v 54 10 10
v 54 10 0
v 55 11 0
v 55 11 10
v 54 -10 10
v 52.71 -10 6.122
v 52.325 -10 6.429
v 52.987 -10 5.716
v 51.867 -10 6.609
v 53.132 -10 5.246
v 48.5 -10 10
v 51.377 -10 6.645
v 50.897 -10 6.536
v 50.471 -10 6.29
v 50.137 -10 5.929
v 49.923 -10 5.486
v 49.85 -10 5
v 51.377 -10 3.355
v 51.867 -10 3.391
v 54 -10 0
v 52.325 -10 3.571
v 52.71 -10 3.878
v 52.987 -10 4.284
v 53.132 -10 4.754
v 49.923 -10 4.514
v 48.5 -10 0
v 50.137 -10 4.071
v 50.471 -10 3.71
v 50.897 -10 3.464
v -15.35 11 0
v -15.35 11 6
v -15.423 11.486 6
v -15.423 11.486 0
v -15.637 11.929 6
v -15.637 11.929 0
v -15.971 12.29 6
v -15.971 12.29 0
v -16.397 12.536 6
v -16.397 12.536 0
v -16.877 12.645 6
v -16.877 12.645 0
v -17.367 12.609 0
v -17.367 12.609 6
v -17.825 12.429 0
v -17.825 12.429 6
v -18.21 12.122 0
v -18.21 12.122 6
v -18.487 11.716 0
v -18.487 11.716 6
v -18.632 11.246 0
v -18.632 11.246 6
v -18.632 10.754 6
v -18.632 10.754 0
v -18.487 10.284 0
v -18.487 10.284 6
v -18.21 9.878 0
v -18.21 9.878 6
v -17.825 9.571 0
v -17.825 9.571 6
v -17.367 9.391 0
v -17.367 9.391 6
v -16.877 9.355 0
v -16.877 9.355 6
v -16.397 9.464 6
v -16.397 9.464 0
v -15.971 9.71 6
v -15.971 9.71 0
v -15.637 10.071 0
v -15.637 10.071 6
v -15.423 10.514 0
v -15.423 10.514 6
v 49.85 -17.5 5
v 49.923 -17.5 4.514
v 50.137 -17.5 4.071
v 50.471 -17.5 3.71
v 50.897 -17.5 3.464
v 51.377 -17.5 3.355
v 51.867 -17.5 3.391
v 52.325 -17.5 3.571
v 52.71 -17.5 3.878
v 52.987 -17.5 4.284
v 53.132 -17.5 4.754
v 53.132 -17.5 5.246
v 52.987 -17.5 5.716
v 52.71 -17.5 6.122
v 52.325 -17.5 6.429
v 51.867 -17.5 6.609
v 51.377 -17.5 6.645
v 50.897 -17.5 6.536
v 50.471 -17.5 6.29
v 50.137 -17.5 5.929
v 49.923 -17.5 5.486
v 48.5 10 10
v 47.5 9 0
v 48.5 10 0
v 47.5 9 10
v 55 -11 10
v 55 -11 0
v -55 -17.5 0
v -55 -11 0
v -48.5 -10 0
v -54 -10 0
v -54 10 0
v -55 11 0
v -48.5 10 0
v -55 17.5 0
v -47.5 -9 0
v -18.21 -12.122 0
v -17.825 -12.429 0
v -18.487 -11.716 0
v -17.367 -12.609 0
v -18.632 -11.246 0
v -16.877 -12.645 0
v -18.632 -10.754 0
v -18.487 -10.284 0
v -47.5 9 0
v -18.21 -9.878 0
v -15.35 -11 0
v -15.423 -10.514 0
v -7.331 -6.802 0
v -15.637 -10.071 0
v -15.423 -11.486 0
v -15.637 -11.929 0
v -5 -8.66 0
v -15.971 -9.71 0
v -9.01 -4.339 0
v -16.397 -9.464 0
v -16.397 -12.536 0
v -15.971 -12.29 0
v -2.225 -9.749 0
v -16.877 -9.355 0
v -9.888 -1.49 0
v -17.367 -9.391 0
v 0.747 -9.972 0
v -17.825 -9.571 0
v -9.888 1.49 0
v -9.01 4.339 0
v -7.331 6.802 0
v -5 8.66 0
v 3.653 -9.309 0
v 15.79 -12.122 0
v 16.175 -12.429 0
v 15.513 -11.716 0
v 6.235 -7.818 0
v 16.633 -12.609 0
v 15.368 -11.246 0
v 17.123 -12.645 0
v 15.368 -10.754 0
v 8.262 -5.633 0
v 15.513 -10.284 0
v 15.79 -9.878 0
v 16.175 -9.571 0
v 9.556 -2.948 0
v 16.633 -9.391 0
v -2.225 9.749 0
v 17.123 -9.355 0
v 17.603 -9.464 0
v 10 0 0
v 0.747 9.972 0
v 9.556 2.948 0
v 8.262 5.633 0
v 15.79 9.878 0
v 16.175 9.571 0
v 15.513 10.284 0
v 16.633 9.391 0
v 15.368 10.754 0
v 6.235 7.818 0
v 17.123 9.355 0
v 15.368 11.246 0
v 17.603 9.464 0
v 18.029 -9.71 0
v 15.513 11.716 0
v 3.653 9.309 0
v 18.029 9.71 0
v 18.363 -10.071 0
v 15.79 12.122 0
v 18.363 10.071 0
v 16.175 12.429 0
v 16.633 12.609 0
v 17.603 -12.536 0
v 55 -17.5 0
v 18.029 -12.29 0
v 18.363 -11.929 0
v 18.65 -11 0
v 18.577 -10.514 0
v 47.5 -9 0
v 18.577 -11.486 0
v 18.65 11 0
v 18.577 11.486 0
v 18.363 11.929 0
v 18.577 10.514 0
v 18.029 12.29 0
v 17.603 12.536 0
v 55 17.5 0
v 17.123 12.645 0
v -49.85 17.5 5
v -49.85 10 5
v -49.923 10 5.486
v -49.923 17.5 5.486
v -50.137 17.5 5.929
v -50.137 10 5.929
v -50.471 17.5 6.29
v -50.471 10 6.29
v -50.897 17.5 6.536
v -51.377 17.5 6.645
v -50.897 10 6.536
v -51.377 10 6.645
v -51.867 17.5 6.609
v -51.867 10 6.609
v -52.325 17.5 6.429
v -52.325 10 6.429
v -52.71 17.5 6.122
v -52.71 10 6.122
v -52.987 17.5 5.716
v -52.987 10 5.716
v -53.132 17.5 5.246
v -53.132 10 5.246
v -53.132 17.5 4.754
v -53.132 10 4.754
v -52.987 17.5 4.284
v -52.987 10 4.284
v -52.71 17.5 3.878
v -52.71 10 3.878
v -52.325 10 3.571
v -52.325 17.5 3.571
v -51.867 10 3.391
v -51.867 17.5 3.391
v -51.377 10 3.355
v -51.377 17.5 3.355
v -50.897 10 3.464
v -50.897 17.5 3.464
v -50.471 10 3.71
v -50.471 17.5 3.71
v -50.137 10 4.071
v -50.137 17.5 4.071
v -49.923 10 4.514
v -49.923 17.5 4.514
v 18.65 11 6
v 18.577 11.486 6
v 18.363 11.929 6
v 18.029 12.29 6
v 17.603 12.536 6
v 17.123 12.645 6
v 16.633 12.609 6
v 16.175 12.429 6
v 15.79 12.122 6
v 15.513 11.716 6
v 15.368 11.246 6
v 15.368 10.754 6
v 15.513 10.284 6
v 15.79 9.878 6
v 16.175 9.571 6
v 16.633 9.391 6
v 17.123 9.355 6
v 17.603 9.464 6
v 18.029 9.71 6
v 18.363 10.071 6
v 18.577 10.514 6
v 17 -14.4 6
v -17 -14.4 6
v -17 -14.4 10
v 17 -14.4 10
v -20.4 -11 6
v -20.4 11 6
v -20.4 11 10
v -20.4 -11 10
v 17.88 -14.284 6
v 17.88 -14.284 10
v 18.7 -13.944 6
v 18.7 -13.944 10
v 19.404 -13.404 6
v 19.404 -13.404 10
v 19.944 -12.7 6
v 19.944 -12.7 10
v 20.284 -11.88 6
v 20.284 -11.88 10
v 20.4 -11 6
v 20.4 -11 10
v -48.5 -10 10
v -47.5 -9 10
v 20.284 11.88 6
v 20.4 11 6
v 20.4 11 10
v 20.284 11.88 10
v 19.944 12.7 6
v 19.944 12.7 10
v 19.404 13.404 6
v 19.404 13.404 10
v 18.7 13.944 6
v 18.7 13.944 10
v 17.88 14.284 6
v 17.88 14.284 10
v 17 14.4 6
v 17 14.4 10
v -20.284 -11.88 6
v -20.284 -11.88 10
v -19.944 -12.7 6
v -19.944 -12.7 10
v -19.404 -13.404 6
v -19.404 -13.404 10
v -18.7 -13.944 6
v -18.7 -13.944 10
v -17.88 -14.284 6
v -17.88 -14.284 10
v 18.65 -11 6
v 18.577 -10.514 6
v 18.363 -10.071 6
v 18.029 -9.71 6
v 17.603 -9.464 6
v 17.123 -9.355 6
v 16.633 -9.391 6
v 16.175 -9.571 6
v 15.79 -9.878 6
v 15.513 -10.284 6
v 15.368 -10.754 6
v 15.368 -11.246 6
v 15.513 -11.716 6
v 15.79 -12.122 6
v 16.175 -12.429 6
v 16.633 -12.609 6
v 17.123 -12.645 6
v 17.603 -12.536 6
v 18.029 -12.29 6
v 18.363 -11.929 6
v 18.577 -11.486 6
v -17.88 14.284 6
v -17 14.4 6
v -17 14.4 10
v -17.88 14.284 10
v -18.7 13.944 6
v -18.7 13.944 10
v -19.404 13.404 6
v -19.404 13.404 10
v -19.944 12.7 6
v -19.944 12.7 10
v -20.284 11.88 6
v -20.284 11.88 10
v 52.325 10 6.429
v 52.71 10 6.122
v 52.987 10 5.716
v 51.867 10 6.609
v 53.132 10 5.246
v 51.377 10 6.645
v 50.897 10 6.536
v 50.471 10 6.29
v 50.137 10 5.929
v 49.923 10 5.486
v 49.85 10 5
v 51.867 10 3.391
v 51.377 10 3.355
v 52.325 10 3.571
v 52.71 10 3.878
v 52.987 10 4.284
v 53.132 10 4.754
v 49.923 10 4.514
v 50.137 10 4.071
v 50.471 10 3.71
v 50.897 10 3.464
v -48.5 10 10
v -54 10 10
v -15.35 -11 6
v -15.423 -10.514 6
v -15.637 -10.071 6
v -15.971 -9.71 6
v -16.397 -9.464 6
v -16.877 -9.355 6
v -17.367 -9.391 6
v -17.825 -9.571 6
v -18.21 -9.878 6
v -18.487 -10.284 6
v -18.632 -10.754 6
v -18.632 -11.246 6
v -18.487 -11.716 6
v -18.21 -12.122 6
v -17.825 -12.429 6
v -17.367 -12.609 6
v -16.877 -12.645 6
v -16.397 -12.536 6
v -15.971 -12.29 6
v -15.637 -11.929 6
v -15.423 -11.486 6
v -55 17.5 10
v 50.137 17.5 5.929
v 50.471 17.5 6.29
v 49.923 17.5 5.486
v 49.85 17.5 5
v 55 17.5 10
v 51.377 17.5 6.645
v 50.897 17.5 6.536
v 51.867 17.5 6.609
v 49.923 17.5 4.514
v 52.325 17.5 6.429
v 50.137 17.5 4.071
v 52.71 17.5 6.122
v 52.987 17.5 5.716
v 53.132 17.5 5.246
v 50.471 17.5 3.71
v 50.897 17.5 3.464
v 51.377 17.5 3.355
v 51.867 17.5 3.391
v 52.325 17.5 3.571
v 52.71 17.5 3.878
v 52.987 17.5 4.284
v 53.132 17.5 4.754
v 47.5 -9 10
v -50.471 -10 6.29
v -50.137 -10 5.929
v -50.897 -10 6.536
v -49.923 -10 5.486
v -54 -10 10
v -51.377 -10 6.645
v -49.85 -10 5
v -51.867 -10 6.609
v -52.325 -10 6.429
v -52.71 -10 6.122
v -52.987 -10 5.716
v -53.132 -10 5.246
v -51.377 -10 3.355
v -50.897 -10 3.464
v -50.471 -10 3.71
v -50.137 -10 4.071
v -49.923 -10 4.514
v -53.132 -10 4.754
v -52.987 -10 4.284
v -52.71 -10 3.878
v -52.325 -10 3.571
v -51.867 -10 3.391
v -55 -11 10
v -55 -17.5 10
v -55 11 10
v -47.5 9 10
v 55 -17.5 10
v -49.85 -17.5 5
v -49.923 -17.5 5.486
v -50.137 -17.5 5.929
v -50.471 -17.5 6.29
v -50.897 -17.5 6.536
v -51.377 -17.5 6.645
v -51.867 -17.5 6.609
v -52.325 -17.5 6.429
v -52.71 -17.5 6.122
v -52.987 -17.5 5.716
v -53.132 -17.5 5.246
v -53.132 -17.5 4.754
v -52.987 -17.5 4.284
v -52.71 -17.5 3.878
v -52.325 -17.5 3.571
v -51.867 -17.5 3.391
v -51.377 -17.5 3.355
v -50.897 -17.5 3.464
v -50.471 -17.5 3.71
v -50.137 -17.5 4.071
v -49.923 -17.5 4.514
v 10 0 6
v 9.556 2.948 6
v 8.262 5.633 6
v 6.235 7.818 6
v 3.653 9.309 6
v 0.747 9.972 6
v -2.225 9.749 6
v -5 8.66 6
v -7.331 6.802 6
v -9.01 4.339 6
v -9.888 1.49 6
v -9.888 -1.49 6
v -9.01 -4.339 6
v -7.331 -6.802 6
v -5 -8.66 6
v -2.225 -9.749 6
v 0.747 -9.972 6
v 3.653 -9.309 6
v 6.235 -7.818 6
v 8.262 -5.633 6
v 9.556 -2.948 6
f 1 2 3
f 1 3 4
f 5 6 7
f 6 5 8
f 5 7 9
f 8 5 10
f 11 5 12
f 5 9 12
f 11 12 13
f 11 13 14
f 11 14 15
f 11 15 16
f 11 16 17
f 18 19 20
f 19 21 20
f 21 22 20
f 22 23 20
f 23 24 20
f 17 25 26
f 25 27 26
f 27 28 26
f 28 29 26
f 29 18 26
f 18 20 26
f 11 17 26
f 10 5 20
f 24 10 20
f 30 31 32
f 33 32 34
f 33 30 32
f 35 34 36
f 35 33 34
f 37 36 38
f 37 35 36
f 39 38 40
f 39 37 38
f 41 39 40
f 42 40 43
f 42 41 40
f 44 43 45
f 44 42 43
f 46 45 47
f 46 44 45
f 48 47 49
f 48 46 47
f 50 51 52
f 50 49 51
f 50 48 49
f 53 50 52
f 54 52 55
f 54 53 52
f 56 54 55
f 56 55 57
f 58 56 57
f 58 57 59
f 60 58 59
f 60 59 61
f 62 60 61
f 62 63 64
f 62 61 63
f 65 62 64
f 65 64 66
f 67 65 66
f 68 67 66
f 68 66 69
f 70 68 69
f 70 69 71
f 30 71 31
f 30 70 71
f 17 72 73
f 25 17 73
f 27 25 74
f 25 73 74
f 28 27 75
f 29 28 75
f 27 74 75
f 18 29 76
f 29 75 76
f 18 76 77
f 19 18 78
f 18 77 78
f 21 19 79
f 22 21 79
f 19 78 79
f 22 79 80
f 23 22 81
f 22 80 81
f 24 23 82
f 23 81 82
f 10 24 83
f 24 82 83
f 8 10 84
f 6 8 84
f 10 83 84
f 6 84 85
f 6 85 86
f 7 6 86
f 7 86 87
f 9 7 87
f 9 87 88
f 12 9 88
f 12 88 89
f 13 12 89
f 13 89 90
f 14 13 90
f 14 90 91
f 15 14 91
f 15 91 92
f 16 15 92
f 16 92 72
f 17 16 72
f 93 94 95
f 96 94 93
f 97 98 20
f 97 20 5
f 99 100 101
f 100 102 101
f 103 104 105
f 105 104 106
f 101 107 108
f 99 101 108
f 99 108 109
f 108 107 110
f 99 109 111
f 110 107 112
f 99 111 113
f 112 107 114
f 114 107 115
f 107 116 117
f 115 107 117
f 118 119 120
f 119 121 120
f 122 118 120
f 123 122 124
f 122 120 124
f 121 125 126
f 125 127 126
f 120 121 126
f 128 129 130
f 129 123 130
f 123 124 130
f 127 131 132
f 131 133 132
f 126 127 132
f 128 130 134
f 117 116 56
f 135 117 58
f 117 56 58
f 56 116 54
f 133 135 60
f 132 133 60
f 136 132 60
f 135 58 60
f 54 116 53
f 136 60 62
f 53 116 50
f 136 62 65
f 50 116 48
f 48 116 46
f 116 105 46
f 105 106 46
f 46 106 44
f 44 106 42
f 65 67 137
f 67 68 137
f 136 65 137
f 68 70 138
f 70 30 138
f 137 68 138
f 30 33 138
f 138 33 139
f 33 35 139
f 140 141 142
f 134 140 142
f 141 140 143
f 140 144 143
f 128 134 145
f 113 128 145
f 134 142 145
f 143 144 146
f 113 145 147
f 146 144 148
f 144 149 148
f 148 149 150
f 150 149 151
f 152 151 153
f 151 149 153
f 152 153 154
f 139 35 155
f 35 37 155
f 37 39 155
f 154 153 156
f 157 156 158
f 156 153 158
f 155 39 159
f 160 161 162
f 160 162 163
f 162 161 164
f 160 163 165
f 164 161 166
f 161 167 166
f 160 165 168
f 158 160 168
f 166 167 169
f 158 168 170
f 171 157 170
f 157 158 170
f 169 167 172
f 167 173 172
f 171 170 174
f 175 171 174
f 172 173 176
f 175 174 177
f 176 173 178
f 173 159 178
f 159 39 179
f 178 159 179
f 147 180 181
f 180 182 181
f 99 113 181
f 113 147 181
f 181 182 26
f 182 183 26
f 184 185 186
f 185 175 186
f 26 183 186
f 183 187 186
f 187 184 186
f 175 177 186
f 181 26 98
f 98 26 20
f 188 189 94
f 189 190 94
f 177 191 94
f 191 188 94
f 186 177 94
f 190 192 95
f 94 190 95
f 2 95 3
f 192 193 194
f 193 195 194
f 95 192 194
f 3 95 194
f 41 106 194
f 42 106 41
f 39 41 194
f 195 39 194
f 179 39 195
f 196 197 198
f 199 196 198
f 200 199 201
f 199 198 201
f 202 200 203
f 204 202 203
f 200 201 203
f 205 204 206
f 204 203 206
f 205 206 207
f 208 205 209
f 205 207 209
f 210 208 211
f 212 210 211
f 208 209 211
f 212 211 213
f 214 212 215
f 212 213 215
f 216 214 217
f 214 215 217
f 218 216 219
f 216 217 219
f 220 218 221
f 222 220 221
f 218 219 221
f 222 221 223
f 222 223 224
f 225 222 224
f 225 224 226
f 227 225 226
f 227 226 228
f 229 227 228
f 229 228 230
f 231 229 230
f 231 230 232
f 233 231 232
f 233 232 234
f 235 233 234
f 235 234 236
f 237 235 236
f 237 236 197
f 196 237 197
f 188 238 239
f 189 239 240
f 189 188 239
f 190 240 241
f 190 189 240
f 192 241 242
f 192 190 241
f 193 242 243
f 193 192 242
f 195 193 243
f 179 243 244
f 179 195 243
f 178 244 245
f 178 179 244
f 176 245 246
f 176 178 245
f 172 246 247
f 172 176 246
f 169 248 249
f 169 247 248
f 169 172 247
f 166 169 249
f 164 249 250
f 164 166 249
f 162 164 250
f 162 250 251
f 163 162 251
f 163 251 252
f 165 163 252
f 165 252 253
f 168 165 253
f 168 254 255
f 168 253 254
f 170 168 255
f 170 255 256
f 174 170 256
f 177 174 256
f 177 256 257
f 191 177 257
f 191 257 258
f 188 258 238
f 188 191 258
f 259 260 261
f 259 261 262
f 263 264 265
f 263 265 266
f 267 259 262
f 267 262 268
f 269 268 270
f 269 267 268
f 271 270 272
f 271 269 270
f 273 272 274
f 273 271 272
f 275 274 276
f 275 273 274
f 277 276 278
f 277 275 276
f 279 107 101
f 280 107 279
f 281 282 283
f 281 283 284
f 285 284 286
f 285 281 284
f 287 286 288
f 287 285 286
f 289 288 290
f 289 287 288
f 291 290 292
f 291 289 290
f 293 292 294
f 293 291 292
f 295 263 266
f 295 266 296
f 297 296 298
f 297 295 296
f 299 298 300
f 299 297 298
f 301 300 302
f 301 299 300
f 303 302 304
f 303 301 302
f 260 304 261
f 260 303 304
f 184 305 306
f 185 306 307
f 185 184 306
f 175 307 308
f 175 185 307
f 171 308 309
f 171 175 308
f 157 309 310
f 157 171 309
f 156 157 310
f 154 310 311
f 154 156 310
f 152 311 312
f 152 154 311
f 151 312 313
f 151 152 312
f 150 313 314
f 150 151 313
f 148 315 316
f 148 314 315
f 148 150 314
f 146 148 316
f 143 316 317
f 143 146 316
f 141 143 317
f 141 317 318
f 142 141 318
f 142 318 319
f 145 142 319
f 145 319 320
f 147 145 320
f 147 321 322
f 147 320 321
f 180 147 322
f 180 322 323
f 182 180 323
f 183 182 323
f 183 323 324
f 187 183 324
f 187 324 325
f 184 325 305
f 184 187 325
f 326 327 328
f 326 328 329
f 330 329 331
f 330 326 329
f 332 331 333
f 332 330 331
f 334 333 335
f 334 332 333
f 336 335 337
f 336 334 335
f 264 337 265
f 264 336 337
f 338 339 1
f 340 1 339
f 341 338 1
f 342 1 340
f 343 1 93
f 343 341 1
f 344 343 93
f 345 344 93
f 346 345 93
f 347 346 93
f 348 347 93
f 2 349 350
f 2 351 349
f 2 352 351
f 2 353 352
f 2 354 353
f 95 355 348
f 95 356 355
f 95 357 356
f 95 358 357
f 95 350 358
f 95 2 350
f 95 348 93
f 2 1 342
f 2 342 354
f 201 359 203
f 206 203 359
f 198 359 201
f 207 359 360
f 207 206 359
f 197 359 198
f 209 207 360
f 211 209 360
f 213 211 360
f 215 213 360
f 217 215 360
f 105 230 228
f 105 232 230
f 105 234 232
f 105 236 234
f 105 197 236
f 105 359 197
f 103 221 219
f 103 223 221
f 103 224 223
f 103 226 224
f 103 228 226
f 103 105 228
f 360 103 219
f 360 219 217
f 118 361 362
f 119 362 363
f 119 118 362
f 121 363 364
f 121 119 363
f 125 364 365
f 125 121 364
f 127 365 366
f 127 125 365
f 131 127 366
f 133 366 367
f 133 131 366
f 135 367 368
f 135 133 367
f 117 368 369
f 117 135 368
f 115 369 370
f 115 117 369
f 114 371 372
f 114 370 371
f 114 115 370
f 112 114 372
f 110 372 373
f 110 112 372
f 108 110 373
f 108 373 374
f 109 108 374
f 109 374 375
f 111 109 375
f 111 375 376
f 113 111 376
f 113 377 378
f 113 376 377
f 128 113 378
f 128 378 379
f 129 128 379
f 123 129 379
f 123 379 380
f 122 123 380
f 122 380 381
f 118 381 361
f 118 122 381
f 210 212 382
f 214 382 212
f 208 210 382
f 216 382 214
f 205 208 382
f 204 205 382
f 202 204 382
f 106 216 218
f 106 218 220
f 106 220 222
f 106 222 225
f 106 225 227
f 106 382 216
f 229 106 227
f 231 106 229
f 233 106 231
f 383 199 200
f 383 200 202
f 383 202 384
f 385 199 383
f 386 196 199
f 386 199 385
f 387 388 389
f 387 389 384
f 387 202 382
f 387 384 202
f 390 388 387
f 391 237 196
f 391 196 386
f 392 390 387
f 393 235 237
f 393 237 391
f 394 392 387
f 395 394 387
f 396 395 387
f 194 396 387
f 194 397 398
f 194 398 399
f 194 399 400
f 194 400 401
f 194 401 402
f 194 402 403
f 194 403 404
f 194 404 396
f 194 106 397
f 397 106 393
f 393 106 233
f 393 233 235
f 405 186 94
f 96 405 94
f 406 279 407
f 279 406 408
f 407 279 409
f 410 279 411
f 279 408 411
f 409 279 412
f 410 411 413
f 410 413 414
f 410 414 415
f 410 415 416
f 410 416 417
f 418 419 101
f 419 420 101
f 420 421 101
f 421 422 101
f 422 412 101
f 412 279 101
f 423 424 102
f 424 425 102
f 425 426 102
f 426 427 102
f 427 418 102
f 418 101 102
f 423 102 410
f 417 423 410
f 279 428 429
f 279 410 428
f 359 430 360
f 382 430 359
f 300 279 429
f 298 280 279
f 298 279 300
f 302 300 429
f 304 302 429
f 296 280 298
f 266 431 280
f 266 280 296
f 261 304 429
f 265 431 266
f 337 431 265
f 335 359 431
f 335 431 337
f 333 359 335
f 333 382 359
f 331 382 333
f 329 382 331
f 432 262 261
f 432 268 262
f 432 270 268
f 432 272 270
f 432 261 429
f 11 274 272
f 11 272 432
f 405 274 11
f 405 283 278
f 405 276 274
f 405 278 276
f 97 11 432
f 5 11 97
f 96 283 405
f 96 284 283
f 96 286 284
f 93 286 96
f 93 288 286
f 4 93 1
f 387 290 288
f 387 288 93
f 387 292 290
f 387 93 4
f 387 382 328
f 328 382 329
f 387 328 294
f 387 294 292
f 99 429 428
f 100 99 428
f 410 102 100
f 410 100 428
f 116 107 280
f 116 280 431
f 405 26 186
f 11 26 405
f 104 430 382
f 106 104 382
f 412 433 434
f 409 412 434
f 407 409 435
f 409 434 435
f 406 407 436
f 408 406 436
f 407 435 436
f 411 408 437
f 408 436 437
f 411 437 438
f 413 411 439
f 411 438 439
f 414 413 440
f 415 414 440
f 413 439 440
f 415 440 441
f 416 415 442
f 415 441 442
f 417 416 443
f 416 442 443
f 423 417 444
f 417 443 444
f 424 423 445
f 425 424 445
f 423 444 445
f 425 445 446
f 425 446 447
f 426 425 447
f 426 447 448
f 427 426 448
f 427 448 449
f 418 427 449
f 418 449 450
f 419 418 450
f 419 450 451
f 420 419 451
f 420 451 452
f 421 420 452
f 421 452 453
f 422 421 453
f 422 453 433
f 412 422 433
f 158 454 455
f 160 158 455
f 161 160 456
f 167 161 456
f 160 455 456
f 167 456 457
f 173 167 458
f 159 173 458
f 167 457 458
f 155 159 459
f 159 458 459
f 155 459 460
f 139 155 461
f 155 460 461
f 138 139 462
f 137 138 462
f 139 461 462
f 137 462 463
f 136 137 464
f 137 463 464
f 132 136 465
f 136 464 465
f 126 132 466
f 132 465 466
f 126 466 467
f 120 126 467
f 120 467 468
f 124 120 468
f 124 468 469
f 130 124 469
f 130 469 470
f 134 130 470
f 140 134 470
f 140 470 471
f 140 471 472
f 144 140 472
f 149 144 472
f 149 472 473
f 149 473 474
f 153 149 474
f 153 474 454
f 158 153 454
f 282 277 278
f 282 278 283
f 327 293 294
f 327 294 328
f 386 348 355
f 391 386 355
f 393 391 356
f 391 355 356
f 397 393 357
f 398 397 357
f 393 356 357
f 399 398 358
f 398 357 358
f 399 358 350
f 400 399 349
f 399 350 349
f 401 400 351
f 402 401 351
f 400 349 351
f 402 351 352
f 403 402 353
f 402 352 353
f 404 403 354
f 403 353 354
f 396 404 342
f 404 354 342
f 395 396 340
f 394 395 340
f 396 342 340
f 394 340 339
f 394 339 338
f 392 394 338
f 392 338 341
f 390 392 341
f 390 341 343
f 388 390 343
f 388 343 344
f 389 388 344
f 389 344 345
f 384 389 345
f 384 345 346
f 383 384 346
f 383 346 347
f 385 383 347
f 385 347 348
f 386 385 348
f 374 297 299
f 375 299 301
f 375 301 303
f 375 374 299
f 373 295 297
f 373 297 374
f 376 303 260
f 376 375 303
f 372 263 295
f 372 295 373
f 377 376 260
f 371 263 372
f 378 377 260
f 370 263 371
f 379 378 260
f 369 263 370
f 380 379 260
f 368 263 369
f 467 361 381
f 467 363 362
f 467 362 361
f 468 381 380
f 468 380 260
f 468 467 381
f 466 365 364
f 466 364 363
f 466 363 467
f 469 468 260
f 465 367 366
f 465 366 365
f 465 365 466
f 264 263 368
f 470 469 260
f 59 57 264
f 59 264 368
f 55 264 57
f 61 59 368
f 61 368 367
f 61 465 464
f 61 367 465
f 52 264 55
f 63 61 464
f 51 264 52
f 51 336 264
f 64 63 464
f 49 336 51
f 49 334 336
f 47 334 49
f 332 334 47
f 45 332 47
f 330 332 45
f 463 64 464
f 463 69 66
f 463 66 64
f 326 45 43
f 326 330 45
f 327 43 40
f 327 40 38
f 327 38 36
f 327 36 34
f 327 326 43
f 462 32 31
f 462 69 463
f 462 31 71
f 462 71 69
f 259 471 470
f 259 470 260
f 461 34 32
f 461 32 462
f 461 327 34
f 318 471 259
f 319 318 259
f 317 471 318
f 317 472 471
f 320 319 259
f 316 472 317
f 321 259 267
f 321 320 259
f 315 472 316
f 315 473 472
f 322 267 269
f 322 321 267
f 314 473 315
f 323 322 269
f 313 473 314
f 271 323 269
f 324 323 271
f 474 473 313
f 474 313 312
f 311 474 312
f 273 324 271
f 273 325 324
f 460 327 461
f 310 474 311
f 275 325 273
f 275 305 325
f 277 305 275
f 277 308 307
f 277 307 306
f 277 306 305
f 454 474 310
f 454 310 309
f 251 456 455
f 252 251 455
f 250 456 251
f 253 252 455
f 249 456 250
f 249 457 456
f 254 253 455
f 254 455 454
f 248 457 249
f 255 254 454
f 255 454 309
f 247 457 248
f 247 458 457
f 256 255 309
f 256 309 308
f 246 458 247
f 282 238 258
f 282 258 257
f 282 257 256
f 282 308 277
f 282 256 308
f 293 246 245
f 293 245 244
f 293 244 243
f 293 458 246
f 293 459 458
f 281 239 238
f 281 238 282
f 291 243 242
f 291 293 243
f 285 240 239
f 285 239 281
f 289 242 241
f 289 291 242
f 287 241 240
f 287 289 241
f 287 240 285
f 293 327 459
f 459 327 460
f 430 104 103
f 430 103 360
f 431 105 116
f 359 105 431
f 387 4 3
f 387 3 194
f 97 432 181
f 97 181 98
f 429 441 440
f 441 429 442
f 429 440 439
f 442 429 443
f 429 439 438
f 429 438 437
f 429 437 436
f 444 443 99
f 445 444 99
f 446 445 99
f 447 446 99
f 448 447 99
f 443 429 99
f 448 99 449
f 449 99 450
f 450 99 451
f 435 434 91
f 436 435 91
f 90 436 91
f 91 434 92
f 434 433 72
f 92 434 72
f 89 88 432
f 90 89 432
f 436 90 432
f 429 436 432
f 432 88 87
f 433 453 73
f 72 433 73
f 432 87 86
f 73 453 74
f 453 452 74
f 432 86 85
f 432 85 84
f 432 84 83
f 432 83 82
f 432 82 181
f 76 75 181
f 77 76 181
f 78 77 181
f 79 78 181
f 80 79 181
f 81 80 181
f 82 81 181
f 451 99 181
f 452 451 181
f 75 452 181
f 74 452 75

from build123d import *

# Parameters (mm, degrees)
SKETCH_1_W          = 110
SKETCH_1_H          = 35
SKETCH_1_R          = 1.65
EXTRUDE_1_DEPTH     = 10
SKETCH_3_W          = 40
SKETCH_3_H          = 28
CUT_EXTRUDE_1_DEPTH = 4
FILLET_1_R          = 3
SKETCH_4_R          = 1.65
CUT_EXTRUDE_2_DEPTH = 66.954529791
CUT_EXTRUDE_3_DEPTH = 4
SKETCH_7_W          = 15
SKETCH_7_H          = 20
CUT_EXTRUDE_5_DEPTH = 59.576872569
CHAMFER_1_SIZE      = 1
SKETCH_8_R          = 10
CUT_EXTRUDE_6_DEPTH = 10


with BuildPart() as part:
    # 草图1 → 凸台-拉伸1 (new body)
    with BuildSketch(Plane.XY):
        Rectangle(SKETCH_1_W, SKETCH_1_H)
        with Locations((-17, 11)):
            Circle(SKETCH_1_R, mode=Mode.SUBTRACT)
        with Locations((17, 11)):
            Circle(SKETCH_1_R, mode=Mode.SUBTRACT)
        with Locations((17, -11)):
            Circle(SKETCH_1_R, mode=Mode.SUBTRACT)
        with Locations((-17, -11)):
            Circle(SKETCH_1_R, mode=Mode.SUBTRACT)
    extrude(amount=EXTRUDE_1_DEPTH)

    # 草图3 → 切除-拉伸1 (cut)
    with BuildSketch(Plane.XY.offset(10)):
        Rectangle(SKETCH_3_W, SKETCH_3_H)
    extrude(amount=-CUT_EXTRUDE_1_DEPTH, mode=Mode.SUBTRACT)

    # 圆角1
    fillet_1_edges = [part.edges().sort_by_distance(p)[0] for p in [
        (-20, -14, 8),
        (-20, 14, 8),
        (20, 14, 8),
        (20, -14, 8),
    ]]
    fillet(fillet_1_edges, radius=FILLET_1_R)

    # 草图4 → 切除-拉伸2 (cut, through all)
    with BuildSketch(Plane.XZ.offset(17.5)):
        with Locations((-51.5, 5)):
            Circle(SKETCH_4_R)
        with Locations(Location((51.5, 5, 0), (0, 0, 180))):
            Circle(SKETCH_4_R)
    extrude(amount=-CUT_EXTRUDE_2_DEPTH, mode=Mode.SUBTRACT)

    # 草图5 → 切除-拉伸3 (cut)
    with BuildSketch(Plane.XY.offset(6)):
        with BuildLine():
            Line((-17, -14.4), (17, -14.4))
            ThreePointArc((17, -14.4), (19.404163056, -13.404163056), (20.4, -11))
            Line((20.4, -11), (20.4, 11))
            ThreePointArc((20.4, 11), (19.404163056, 13.404163056), (17, 14.4))
            Line((17, 14.4), (-17, 14.4))
            ThreePointArc((-17, 14.4), (-19.404163056, 13.404163056), (-20.4, 11))
            Line((-20.4, 11), (-20.4, -11))
            ThreePointArc((-20.4, -11), (-19.404163056, -13.404163056), (-17, -14.4))
        make_face()
    extrude(amount=CUT_EXTRUDE_3_DEPTH, mode=Mode.SUBTRACT)

    # 草图7 → 切除-拉伸5 (cut, through all)
    with BuildSketch(Plane(origin=(0, 0, 0), x_dir=(-1, 0, 0), z_dir=(0, 0, -1))):
        with Locations((-55, 0)):
            Rectangle(SKETCH_7_W, SKETCH_7_H)
        with Locations((55, 0)):
            Rectangle(SKETCH_7_W, SKETCH_7_H)
    extrude(amount=-CUT_EXTRUDE_5_DEPTH, mode=Mode.SUBTRACT)

    # 倒角1
    chamfer_1_edges = [part.edges().sort_by_distance(p)[0] for p in [
        (55, -10, 5),
        (47.5, -10, 5),
        (55, 10, 5),
        (47.5, 10, 5),
        (-55, 10, 5),
        (-47.5, 10, 5),
        (-55, -10, 5),
        (-47.5, -10, 5),
    ]]
    chamfer(chamfer_1_edges, length=CHAMFER_1_SIZE)

    # 草图8 → 切除-拉伸6 (cut)
    with BuildSketch(Plane.XY.offset(6)):
        Circle(SKETCH_8_R)
    extrude(amount=-CUT_EXTRUDE_6_DEPTH, mode=Mode.SUBTRACT)


solid = part.part
